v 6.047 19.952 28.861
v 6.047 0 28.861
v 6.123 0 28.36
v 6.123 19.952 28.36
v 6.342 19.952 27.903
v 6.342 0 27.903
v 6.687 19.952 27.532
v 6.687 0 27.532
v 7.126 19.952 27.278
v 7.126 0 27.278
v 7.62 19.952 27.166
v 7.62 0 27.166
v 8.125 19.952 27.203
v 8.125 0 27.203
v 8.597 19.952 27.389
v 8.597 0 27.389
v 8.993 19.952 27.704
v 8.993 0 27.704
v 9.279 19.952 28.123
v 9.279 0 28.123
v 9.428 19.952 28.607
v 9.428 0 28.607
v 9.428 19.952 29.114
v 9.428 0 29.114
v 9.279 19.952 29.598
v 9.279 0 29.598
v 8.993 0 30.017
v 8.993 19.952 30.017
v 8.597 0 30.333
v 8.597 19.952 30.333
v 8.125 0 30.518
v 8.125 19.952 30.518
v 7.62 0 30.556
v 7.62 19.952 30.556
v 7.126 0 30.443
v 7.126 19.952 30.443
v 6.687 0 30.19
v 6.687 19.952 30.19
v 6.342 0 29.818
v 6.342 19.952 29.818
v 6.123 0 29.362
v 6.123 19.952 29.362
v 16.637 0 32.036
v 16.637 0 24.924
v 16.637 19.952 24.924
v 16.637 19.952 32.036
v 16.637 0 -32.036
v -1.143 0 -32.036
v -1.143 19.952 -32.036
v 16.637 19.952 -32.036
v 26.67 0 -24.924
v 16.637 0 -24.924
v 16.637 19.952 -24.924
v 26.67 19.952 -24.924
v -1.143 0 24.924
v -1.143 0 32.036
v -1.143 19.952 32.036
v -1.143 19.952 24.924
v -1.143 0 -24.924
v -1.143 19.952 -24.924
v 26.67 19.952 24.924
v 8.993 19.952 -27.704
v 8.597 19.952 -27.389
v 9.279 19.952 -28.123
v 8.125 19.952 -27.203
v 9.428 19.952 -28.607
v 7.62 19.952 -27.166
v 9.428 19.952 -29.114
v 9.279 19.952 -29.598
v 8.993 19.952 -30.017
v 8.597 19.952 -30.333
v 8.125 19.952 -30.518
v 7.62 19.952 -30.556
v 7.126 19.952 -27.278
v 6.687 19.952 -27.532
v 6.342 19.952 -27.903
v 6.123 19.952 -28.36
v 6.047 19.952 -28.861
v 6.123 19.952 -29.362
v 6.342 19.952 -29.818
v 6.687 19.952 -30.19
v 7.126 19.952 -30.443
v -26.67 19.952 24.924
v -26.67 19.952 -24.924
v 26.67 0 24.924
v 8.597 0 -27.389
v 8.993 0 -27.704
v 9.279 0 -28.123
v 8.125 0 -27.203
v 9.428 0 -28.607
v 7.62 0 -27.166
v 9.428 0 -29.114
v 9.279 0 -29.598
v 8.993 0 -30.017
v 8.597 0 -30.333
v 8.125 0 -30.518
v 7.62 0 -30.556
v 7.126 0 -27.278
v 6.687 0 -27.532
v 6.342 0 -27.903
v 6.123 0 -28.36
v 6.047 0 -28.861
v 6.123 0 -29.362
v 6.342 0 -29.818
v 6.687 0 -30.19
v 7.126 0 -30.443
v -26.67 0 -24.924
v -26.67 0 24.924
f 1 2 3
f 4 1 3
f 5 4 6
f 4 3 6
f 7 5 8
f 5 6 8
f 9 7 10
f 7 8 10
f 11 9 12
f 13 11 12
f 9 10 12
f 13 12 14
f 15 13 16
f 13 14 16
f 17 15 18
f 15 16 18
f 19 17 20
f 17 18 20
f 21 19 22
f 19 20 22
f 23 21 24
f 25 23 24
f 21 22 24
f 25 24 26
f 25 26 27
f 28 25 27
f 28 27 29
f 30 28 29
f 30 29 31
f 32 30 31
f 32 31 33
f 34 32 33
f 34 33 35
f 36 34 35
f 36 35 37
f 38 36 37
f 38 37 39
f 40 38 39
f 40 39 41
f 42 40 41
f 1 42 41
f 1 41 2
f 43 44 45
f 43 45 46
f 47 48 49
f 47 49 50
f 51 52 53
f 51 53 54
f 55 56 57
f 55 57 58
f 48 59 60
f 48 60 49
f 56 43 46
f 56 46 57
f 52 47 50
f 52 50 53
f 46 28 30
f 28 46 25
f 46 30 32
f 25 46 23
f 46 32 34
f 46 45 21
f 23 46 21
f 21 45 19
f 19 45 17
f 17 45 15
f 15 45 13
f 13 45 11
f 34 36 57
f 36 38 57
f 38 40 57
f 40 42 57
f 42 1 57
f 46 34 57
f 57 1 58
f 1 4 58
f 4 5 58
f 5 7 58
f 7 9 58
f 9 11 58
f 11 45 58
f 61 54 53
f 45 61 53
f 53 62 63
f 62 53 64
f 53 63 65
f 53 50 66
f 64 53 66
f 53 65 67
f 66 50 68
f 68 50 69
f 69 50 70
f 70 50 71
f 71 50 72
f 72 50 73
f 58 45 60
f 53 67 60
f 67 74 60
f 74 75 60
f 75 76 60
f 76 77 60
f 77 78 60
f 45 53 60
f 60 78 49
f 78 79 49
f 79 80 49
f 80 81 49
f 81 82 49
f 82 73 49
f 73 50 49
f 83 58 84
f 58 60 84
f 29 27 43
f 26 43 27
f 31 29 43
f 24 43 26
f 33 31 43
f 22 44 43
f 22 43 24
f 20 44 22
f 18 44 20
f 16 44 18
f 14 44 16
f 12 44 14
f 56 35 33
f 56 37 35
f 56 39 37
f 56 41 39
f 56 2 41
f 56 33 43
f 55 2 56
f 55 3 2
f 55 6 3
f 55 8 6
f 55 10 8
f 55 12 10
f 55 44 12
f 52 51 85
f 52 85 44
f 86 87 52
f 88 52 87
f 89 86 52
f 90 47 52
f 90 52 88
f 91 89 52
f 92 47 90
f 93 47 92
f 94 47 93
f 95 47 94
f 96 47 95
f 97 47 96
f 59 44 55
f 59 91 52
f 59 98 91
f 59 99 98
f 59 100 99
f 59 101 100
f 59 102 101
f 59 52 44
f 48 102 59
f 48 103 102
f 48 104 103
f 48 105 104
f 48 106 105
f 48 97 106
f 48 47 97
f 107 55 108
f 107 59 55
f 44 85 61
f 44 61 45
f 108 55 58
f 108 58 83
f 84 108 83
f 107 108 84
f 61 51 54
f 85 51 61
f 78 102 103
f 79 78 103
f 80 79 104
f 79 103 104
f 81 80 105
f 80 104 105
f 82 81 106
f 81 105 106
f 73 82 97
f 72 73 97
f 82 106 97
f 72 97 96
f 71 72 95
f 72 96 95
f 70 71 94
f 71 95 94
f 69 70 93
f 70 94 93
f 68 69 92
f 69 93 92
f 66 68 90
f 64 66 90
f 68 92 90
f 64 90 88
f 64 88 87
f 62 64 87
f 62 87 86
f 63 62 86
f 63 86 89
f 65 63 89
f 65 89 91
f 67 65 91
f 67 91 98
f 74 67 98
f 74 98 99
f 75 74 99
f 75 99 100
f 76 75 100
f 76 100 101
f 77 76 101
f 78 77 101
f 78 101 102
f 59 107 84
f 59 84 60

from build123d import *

# Parameters (mm, degrees)
BOSS_EXTRUDE1_DEPTH  = 19.9517
M3_CLEARANCE_HOLE1_D = 3.4


with BuildPart() as part:
    # Sketch1 → Boss-Extrude1 (new body)
    with BuildSketch(Plane(origin=(0, 0, 0), x_dir=(1, 0, 0), z_dir=(0, 1, 0))):
        Polygon((16.637, 24.92375), (26.67, 24.92375), (26.67, -24.92375), (16.637, -24.92375), (16.637, -32.03575), (-1.143, -32.03575), (-1.143, -24.92375), (-26.67, -24.92375), (-26.67, 24.92375), (-1.143, 24.92375), (-1.143, 32.03575), (16.637, 32.03575), align=None)
    extrude(amount=BOSS_EXTRUDE1_DEPTH)

    # M3 Clearance Hole1 (through all)
    with Locations(Plane(origin=(0, 19.9517, 0), x_dir=(1, 0, 0), z_dir=(0, 1, 0))):
        with Locations((7.747, 28.86075), (7.747, -28.86075)):
            Hole(M3_CLEARANCE_HOLE1_D / 2)


solid = part.part
